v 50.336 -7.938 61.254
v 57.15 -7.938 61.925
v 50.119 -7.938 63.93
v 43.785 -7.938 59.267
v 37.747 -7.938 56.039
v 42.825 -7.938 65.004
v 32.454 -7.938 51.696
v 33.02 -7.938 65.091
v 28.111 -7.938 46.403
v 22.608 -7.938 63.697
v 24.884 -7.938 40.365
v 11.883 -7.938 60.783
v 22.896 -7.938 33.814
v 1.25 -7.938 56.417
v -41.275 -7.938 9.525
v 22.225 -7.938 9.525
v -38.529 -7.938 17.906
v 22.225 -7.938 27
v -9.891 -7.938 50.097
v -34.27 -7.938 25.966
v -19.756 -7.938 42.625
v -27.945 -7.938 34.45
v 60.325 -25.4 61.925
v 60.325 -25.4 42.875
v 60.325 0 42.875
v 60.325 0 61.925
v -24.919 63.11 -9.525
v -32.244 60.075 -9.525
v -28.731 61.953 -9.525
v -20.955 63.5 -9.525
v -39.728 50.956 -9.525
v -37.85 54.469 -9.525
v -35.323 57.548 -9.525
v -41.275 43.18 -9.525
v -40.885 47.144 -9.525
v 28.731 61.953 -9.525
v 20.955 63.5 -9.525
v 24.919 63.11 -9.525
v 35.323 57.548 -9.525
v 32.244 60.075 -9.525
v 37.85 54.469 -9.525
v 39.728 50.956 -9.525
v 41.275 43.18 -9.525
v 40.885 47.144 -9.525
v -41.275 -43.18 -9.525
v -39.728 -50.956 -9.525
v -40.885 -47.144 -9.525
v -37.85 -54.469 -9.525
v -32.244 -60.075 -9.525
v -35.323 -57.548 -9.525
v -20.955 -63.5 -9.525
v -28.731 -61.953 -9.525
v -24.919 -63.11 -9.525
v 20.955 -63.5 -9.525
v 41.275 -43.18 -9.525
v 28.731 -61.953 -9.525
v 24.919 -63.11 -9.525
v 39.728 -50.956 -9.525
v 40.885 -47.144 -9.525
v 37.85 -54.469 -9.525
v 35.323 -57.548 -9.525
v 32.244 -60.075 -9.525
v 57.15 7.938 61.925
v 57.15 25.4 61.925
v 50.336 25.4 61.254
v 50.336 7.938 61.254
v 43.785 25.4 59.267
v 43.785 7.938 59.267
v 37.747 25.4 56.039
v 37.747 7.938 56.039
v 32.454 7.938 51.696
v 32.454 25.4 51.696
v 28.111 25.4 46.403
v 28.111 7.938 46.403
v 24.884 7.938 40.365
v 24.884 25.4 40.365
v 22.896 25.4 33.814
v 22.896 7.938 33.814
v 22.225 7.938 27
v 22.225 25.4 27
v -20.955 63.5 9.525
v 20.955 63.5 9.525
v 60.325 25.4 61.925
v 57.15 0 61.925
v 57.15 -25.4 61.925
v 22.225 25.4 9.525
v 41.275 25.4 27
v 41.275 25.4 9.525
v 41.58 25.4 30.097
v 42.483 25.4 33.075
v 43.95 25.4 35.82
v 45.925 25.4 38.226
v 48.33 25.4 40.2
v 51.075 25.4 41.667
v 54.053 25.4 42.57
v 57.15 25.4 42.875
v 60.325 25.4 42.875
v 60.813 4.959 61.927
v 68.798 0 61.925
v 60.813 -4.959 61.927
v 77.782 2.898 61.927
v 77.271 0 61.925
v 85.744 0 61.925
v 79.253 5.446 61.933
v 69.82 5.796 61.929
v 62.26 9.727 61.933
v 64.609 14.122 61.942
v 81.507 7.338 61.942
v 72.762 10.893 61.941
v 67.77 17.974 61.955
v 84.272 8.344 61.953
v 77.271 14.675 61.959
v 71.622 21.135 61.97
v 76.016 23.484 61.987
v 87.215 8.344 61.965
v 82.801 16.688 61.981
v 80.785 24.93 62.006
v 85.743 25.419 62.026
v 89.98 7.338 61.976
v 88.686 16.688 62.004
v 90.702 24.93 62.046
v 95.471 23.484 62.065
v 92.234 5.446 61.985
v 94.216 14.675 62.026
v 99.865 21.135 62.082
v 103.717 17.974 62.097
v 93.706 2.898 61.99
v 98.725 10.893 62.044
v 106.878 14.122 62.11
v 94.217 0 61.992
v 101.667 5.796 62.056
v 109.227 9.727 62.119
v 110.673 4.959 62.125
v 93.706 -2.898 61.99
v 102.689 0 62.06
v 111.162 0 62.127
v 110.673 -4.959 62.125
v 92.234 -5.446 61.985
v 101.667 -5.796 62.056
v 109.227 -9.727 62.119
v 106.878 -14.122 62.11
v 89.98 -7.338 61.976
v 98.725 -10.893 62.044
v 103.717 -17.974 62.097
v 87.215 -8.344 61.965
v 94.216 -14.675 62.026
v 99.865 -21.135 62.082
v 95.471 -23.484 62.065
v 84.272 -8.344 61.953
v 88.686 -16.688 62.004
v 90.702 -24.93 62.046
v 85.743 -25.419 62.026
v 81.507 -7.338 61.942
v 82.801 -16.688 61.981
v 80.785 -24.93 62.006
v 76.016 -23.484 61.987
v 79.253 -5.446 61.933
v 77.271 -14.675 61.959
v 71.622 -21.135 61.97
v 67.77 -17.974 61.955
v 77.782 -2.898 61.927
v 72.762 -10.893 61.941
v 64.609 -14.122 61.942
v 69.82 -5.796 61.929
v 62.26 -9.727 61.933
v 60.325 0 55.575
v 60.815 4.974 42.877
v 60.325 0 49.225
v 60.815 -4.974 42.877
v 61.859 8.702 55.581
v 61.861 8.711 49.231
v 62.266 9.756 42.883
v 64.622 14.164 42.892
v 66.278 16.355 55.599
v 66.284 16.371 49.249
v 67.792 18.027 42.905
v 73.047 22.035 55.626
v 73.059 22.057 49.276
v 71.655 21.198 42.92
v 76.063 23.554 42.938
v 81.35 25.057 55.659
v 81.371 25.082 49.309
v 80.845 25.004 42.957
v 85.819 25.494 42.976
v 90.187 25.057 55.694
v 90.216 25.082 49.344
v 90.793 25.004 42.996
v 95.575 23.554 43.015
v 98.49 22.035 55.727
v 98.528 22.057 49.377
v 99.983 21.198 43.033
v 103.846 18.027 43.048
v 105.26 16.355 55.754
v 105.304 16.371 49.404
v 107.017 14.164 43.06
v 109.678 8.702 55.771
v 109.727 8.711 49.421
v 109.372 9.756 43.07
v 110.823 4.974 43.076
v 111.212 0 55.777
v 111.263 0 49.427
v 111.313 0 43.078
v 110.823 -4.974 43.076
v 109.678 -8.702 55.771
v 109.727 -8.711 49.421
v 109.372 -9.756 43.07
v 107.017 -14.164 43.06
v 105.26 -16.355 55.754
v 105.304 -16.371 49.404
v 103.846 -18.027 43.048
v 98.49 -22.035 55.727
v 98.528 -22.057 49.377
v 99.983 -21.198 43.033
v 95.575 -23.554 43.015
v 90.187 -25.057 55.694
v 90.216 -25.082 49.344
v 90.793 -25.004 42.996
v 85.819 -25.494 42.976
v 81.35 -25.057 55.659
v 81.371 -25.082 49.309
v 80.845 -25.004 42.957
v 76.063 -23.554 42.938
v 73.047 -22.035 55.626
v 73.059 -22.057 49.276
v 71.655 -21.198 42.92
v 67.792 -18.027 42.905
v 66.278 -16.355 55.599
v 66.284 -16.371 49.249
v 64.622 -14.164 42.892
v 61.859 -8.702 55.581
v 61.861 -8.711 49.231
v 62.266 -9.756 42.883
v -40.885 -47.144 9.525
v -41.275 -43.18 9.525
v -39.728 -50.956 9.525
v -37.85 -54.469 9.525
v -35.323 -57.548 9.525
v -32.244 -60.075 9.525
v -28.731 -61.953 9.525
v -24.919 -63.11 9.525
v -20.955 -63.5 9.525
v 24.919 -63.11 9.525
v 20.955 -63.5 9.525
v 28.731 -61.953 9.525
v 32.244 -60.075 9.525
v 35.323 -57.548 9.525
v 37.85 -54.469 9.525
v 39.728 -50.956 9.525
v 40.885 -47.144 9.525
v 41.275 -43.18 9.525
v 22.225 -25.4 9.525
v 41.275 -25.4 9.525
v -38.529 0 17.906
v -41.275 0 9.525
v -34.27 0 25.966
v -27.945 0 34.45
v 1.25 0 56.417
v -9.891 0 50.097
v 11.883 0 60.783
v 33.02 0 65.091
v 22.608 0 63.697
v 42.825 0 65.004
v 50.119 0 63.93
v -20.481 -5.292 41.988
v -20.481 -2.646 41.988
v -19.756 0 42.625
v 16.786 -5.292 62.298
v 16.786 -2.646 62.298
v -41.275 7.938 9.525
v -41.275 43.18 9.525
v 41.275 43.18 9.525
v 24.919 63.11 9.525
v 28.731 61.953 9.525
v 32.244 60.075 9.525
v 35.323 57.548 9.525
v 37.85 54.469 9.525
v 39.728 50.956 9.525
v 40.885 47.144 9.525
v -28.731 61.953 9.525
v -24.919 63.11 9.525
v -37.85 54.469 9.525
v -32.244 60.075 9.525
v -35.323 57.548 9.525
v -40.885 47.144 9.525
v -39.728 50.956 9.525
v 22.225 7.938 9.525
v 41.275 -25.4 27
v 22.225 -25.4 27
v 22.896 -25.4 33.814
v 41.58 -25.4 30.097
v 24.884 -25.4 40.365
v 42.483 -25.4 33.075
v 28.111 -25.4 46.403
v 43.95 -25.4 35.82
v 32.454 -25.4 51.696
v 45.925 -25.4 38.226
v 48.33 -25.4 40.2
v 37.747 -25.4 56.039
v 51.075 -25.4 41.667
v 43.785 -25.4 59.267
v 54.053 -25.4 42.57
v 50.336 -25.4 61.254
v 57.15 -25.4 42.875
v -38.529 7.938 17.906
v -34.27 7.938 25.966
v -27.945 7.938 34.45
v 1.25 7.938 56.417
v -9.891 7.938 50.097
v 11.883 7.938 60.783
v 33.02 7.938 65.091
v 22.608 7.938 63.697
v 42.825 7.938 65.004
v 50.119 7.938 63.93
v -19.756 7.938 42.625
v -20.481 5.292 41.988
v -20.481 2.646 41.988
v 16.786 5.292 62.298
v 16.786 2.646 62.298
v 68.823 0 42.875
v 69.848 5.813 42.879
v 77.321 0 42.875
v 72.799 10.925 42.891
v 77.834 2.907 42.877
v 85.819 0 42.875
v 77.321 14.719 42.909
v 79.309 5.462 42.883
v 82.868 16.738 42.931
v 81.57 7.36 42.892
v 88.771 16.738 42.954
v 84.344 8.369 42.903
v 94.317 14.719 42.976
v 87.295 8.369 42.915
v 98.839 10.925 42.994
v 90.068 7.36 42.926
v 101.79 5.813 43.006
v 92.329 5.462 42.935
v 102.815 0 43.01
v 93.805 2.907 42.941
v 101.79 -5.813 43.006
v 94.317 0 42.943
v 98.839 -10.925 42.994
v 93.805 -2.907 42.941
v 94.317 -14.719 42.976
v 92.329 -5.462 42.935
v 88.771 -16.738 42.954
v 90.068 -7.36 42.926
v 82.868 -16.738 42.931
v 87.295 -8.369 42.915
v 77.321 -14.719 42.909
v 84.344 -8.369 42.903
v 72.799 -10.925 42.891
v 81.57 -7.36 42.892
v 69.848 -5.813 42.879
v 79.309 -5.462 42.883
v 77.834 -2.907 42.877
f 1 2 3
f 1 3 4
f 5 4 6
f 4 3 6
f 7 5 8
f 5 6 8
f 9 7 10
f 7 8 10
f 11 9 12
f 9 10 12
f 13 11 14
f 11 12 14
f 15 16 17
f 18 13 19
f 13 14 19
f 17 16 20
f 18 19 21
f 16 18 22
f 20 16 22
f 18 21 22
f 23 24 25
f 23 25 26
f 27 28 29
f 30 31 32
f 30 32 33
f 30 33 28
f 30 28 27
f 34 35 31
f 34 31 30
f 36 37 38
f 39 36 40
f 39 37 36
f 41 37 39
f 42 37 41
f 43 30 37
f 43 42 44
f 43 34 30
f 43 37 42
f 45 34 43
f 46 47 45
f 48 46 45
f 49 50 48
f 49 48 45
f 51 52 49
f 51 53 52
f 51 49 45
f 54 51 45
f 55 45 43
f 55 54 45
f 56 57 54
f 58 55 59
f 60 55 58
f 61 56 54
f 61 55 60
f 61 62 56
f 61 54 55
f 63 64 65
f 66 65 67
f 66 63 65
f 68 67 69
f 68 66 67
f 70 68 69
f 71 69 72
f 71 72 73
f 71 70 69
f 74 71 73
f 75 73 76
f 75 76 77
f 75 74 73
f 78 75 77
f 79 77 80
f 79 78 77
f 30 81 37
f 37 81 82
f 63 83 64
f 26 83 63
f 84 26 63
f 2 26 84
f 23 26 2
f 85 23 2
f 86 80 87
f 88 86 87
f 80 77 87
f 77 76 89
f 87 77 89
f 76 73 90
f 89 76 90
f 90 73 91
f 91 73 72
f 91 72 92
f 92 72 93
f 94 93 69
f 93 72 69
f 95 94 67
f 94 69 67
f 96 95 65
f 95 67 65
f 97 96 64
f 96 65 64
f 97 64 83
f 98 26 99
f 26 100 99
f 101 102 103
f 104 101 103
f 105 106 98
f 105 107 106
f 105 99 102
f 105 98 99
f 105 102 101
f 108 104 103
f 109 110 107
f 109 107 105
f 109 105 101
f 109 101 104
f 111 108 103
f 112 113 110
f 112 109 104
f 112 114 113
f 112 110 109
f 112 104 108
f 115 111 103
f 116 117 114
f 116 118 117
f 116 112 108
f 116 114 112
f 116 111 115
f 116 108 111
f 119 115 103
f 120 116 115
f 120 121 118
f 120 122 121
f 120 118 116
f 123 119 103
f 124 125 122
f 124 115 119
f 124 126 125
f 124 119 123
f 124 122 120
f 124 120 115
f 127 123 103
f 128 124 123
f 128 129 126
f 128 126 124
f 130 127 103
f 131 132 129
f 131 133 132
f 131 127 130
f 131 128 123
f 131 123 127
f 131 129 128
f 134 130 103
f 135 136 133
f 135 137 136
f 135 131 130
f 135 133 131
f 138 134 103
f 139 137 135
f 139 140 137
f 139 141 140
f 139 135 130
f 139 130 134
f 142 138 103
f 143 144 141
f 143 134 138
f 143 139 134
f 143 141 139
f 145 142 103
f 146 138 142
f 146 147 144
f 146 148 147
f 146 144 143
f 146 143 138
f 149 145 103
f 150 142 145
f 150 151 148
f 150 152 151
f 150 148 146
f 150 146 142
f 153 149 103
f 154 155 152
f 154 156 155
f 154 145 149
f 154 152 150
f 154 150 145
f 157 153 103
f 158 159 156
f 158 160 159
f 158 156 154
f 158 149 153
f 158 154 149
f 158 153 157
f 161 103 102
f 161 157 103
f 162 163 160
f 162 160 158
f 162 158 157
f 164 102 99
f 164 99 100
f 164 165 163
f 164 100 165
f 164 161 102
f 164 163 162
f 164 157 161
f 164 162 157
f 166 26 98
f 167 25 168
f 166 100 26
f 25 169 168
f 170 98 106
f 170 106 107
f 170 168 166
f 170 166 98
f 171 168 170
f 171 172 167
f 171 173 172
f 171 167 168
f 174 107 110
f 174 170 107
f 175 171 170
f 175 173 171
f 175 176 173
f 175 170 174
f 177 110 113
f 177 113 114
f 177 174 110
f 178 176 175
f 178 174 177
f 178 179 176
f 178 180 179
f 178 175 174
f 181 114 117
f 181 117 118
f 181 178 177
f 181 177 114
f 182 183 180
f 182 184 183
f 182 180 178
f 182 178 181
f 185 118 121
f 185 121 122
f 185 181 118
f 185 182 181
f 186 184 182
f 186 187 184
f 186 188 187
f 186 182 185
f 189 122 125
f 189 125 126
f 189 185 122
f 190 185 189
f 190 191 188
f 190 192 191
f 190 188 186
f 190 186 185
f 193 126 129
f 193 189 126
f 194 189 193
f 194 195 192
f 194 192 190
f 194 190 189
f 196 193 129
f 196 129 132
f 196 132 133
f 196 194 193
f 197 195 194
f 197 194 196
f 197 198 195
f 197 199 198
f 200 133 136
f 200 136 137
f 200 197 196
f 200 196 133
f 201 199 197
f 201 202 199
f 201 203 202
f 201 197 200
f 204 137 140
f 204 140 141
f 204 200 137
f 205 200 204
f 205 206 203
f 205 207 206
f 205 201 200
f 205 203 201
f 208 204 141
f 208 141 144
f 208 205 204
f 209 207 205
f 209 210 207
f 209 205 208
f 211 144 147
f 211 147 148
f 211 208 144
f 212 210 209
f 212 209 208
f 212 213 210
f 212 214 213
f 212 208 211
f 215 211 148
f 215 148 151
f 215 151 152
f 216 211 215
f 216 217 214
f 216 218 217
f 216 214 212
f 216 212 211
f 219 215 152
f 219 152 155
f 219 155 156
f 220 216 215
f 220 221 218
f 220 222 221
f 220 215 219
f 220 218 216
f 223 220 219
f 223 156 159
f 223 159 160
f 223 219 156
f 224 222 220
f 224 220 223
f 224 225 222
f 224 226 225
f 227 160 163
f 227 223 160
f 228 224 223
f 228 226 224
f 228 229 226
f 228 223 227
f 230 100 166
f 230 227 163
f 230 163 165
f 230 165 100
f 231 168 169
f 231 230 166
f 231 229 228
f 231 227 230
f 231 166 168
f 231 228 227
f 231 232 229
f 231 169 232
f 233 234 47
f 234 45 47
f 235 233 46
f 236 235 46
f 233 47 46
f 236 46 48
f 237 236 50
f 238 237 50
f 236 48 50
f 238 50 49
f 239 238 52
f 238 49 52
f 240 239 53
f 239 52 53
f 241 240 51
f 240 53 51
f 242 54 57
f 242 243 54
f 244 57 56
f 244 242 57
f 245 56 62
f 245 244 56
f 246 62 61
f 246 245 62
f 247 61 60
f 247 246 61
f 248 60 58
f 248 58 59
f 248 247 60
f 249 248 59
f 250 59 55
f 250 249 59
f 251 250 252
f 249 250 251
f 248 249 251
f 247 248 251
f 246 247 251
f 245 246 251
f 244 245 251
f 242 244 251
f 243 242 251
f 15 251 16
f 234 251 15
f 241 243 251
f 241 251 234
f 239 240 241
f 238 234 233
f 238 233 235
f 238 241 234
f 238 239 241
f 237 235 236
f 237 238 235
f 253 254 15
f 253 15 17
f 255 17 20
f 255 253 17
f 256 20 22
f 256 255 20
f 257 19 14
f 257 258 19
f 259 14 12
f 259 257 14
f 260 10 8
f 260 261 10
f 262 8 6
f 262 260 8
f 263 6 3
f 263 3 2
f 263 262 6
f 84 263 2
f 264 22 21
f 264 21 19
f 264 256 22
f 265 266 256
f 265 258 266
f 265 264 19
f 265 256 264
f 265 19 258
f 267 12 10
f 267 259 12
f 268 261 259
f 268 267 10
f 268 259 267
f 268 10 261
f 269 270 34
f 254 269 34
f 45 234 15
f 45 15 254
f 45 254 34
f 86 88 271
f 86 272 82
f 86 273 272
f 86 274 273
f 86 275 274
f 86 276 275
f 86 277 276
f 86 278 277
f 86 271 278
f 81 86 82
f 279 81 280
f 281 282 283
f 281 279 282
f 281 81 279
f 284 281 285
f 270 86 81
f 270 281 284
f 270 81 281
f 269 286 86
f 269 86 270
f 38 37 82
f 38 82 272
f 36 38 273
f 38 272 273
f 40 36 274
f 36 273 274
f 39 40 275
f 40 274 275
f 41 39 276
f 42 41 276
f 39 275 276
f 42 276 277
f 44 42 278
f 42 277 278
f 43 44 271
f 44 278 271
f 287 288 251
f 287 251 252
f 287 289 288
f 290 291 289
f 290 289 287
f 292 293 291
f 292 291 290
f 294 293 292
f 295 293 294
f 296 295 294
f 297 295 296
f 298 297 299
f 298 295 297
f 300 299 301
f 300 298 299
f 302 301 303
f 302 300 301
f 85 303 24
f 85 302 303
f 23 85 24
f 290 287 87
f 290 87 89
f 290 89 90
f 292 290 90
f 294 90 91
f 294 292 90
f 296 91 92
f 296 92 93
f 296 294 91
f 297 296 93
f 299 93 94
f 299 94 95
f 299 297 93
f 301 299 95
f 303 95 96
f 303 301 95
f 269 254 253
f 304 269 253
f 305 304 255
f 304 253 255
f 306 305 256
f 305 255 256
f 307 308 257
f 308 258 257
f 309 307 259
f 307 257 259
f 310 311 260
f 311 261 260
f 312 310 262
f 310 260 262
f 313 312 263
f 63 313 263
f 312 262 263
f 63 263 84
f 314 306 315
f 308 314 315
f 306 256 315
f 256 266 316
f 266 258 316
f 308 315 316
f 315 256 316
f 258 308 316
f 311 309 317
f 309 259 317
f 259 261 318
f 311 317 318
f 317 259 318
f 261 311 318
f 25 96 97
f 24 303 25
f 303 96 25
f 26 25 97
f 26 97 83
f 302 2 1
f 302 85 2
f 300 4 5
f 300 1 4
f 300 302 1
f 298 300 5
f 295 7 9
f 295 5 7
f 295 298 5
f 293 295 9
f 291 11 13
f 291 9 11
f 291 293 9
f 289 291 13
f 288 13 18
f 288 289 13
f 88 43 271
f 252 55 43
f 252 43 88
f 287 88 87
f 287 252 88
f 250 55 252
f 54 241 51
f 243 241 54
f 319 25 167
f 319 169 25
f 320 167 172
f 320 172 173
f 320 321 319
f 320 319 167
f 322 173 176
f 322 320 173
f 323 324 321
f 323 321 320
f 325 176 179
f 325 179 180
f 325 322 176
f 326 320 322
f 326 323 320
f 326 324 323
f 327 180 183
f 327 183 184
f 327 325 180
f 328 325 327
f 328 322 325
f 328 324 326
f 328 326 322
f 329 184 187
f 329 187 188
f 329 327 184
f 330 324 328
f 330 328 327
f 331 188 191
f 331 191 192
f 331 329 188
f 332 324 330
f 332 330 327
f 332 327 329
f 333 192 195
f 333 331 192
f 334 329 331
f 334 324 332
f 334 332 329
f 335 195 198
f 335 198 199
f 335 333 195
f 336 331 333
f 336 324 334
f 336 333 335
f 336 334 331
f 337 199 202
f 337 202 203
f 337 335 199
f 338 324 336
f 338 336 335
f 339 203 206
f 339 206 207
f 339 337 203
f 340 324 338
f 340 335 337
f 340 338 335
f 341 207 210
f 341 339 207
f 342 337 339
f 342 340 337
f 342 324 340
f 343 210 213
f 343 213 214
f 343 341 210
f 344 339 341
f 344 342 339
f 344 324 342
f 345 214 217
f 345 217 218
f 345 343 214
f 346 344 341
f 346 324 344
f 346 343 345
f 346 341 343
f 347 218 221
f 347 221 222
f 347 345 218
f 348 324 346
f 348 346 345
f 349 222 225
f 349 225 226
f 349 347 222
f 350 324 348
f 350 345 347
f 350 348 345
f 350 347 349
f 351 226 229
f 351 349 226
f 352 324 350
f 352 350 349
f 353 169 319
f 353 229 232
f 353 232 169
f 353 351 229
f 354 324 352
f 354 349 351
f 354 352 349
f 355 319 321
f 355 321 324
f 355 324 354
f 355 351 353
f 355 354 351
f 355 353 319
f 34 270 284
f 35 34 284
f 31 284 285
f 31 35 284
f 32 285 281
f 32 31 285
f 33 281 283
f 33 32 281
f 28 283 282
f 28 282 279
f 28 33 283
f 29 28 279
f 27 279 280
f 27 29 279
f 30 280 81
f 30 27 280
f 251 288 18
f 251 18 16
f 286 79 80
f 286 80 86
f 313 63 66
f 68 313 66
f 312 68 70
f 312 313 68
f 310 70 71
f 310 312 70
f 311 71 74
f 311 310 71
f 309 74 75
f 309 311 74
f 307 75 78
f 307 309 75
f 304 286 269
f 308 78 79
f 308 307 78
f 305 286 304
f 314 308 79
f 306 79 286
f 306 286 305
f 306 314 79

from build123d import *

# Parameters (mm, degrees)
F1_DEPTH = 63.5
F2_DEPTH = 25.4
F3_DEPTH = 7.9375
F5_R     = 20.32


# Not quite as in the source:
# - a feature names something its author has since deleted; it is built from what else it names


with BuildPart() as f1:
    # F0 (on Front) → F1 (new body, symmetric)
    with BuildSketch(Plane.XZ):
        Polygon((22.225, 9.525), (-41.275, 9.525), (-41.275, -9.525), (41.275, -9.525), (41.275, 9.525), align=None)
    extrude(amount=F1_DEPTH, both=True)

    # F0 (on Front) → F2 (join, symmetric)
    with BuildSketch(Plane.XZ):
        with BuildLine():
            Line((22.225, 27.0002), (22.225, 9.525))
            Line((22.225, 9.525), (41.275, 9.525))
            Line((41.275, 9.525), (41.275, 27.0002))
            ThreePointArc((41.275, 27.0002), (45.9246798487, 38.2255201513), (57.15, 42.8752))
            Line((57.15, 42.8752), (60.325, 42.8752))
            Line((60.325, 42.8752), (60.325, 61.9252))
            Line((60.325, 61.9252), (57.15, 61.9252))
            ThreePointArc((57.15, 61.9252), (32.4542956671, 51.6959043329), (22.225, 27.0002))
        make_face()
    extrude(amount=F2_DEPTH, both=True)

    # F0 (on Front) → F3 (join, symmetric)
    with BuildSketch(Plane.XZ):
        with BuildLine():
            add(Edge.make_bspline(
                [(-41.275, 9.525), (-33.1754907966, 45.2206768095), (19.6965429932, 75.4829570651), (57.15, 61.9252)],
                knots=[0, 0, 0, 0, 111.5045361635, 111.5045361635, 111.5045361635, 111.5045361635], degree=3))
            Line((-41.275, 9.525), (22.225, 9.525))
            Line((22.225, 9.525), (22.225, 27.0002))
            ThreePointArc((22.225, 27.0002), (32.4542956671, 51.6959043329), (57.15, 61.9252))
        make_face()
    extrude(amount=F3_DEPTH, both=True)

    # F0 (on Front) → F4 (revolve)
    with BuildSketch(Plane.XZ):
        Polygon((85.7438487918, 61.9252), (60.325, 61.9252), (60.325, 42.8752), (85.8194455504, 42.8752), align=None)
    revolve(axis=Axis((85.7816471711, 0, 52.4002), (0.0039683025, 0, -0.9999921263)))

    # F5
    f5_edges = [f1.edges().sort_by_distance(p)[0] for p in [
        (41.275, 63.5, 0),
        (-41.275, 63.5, 0),
        (-41.275, -63.5, 0),
        (41.275, -63.5, 0),
    ]]
    fillet(f5_edges, radius=F5_R)


solid = f1.part
